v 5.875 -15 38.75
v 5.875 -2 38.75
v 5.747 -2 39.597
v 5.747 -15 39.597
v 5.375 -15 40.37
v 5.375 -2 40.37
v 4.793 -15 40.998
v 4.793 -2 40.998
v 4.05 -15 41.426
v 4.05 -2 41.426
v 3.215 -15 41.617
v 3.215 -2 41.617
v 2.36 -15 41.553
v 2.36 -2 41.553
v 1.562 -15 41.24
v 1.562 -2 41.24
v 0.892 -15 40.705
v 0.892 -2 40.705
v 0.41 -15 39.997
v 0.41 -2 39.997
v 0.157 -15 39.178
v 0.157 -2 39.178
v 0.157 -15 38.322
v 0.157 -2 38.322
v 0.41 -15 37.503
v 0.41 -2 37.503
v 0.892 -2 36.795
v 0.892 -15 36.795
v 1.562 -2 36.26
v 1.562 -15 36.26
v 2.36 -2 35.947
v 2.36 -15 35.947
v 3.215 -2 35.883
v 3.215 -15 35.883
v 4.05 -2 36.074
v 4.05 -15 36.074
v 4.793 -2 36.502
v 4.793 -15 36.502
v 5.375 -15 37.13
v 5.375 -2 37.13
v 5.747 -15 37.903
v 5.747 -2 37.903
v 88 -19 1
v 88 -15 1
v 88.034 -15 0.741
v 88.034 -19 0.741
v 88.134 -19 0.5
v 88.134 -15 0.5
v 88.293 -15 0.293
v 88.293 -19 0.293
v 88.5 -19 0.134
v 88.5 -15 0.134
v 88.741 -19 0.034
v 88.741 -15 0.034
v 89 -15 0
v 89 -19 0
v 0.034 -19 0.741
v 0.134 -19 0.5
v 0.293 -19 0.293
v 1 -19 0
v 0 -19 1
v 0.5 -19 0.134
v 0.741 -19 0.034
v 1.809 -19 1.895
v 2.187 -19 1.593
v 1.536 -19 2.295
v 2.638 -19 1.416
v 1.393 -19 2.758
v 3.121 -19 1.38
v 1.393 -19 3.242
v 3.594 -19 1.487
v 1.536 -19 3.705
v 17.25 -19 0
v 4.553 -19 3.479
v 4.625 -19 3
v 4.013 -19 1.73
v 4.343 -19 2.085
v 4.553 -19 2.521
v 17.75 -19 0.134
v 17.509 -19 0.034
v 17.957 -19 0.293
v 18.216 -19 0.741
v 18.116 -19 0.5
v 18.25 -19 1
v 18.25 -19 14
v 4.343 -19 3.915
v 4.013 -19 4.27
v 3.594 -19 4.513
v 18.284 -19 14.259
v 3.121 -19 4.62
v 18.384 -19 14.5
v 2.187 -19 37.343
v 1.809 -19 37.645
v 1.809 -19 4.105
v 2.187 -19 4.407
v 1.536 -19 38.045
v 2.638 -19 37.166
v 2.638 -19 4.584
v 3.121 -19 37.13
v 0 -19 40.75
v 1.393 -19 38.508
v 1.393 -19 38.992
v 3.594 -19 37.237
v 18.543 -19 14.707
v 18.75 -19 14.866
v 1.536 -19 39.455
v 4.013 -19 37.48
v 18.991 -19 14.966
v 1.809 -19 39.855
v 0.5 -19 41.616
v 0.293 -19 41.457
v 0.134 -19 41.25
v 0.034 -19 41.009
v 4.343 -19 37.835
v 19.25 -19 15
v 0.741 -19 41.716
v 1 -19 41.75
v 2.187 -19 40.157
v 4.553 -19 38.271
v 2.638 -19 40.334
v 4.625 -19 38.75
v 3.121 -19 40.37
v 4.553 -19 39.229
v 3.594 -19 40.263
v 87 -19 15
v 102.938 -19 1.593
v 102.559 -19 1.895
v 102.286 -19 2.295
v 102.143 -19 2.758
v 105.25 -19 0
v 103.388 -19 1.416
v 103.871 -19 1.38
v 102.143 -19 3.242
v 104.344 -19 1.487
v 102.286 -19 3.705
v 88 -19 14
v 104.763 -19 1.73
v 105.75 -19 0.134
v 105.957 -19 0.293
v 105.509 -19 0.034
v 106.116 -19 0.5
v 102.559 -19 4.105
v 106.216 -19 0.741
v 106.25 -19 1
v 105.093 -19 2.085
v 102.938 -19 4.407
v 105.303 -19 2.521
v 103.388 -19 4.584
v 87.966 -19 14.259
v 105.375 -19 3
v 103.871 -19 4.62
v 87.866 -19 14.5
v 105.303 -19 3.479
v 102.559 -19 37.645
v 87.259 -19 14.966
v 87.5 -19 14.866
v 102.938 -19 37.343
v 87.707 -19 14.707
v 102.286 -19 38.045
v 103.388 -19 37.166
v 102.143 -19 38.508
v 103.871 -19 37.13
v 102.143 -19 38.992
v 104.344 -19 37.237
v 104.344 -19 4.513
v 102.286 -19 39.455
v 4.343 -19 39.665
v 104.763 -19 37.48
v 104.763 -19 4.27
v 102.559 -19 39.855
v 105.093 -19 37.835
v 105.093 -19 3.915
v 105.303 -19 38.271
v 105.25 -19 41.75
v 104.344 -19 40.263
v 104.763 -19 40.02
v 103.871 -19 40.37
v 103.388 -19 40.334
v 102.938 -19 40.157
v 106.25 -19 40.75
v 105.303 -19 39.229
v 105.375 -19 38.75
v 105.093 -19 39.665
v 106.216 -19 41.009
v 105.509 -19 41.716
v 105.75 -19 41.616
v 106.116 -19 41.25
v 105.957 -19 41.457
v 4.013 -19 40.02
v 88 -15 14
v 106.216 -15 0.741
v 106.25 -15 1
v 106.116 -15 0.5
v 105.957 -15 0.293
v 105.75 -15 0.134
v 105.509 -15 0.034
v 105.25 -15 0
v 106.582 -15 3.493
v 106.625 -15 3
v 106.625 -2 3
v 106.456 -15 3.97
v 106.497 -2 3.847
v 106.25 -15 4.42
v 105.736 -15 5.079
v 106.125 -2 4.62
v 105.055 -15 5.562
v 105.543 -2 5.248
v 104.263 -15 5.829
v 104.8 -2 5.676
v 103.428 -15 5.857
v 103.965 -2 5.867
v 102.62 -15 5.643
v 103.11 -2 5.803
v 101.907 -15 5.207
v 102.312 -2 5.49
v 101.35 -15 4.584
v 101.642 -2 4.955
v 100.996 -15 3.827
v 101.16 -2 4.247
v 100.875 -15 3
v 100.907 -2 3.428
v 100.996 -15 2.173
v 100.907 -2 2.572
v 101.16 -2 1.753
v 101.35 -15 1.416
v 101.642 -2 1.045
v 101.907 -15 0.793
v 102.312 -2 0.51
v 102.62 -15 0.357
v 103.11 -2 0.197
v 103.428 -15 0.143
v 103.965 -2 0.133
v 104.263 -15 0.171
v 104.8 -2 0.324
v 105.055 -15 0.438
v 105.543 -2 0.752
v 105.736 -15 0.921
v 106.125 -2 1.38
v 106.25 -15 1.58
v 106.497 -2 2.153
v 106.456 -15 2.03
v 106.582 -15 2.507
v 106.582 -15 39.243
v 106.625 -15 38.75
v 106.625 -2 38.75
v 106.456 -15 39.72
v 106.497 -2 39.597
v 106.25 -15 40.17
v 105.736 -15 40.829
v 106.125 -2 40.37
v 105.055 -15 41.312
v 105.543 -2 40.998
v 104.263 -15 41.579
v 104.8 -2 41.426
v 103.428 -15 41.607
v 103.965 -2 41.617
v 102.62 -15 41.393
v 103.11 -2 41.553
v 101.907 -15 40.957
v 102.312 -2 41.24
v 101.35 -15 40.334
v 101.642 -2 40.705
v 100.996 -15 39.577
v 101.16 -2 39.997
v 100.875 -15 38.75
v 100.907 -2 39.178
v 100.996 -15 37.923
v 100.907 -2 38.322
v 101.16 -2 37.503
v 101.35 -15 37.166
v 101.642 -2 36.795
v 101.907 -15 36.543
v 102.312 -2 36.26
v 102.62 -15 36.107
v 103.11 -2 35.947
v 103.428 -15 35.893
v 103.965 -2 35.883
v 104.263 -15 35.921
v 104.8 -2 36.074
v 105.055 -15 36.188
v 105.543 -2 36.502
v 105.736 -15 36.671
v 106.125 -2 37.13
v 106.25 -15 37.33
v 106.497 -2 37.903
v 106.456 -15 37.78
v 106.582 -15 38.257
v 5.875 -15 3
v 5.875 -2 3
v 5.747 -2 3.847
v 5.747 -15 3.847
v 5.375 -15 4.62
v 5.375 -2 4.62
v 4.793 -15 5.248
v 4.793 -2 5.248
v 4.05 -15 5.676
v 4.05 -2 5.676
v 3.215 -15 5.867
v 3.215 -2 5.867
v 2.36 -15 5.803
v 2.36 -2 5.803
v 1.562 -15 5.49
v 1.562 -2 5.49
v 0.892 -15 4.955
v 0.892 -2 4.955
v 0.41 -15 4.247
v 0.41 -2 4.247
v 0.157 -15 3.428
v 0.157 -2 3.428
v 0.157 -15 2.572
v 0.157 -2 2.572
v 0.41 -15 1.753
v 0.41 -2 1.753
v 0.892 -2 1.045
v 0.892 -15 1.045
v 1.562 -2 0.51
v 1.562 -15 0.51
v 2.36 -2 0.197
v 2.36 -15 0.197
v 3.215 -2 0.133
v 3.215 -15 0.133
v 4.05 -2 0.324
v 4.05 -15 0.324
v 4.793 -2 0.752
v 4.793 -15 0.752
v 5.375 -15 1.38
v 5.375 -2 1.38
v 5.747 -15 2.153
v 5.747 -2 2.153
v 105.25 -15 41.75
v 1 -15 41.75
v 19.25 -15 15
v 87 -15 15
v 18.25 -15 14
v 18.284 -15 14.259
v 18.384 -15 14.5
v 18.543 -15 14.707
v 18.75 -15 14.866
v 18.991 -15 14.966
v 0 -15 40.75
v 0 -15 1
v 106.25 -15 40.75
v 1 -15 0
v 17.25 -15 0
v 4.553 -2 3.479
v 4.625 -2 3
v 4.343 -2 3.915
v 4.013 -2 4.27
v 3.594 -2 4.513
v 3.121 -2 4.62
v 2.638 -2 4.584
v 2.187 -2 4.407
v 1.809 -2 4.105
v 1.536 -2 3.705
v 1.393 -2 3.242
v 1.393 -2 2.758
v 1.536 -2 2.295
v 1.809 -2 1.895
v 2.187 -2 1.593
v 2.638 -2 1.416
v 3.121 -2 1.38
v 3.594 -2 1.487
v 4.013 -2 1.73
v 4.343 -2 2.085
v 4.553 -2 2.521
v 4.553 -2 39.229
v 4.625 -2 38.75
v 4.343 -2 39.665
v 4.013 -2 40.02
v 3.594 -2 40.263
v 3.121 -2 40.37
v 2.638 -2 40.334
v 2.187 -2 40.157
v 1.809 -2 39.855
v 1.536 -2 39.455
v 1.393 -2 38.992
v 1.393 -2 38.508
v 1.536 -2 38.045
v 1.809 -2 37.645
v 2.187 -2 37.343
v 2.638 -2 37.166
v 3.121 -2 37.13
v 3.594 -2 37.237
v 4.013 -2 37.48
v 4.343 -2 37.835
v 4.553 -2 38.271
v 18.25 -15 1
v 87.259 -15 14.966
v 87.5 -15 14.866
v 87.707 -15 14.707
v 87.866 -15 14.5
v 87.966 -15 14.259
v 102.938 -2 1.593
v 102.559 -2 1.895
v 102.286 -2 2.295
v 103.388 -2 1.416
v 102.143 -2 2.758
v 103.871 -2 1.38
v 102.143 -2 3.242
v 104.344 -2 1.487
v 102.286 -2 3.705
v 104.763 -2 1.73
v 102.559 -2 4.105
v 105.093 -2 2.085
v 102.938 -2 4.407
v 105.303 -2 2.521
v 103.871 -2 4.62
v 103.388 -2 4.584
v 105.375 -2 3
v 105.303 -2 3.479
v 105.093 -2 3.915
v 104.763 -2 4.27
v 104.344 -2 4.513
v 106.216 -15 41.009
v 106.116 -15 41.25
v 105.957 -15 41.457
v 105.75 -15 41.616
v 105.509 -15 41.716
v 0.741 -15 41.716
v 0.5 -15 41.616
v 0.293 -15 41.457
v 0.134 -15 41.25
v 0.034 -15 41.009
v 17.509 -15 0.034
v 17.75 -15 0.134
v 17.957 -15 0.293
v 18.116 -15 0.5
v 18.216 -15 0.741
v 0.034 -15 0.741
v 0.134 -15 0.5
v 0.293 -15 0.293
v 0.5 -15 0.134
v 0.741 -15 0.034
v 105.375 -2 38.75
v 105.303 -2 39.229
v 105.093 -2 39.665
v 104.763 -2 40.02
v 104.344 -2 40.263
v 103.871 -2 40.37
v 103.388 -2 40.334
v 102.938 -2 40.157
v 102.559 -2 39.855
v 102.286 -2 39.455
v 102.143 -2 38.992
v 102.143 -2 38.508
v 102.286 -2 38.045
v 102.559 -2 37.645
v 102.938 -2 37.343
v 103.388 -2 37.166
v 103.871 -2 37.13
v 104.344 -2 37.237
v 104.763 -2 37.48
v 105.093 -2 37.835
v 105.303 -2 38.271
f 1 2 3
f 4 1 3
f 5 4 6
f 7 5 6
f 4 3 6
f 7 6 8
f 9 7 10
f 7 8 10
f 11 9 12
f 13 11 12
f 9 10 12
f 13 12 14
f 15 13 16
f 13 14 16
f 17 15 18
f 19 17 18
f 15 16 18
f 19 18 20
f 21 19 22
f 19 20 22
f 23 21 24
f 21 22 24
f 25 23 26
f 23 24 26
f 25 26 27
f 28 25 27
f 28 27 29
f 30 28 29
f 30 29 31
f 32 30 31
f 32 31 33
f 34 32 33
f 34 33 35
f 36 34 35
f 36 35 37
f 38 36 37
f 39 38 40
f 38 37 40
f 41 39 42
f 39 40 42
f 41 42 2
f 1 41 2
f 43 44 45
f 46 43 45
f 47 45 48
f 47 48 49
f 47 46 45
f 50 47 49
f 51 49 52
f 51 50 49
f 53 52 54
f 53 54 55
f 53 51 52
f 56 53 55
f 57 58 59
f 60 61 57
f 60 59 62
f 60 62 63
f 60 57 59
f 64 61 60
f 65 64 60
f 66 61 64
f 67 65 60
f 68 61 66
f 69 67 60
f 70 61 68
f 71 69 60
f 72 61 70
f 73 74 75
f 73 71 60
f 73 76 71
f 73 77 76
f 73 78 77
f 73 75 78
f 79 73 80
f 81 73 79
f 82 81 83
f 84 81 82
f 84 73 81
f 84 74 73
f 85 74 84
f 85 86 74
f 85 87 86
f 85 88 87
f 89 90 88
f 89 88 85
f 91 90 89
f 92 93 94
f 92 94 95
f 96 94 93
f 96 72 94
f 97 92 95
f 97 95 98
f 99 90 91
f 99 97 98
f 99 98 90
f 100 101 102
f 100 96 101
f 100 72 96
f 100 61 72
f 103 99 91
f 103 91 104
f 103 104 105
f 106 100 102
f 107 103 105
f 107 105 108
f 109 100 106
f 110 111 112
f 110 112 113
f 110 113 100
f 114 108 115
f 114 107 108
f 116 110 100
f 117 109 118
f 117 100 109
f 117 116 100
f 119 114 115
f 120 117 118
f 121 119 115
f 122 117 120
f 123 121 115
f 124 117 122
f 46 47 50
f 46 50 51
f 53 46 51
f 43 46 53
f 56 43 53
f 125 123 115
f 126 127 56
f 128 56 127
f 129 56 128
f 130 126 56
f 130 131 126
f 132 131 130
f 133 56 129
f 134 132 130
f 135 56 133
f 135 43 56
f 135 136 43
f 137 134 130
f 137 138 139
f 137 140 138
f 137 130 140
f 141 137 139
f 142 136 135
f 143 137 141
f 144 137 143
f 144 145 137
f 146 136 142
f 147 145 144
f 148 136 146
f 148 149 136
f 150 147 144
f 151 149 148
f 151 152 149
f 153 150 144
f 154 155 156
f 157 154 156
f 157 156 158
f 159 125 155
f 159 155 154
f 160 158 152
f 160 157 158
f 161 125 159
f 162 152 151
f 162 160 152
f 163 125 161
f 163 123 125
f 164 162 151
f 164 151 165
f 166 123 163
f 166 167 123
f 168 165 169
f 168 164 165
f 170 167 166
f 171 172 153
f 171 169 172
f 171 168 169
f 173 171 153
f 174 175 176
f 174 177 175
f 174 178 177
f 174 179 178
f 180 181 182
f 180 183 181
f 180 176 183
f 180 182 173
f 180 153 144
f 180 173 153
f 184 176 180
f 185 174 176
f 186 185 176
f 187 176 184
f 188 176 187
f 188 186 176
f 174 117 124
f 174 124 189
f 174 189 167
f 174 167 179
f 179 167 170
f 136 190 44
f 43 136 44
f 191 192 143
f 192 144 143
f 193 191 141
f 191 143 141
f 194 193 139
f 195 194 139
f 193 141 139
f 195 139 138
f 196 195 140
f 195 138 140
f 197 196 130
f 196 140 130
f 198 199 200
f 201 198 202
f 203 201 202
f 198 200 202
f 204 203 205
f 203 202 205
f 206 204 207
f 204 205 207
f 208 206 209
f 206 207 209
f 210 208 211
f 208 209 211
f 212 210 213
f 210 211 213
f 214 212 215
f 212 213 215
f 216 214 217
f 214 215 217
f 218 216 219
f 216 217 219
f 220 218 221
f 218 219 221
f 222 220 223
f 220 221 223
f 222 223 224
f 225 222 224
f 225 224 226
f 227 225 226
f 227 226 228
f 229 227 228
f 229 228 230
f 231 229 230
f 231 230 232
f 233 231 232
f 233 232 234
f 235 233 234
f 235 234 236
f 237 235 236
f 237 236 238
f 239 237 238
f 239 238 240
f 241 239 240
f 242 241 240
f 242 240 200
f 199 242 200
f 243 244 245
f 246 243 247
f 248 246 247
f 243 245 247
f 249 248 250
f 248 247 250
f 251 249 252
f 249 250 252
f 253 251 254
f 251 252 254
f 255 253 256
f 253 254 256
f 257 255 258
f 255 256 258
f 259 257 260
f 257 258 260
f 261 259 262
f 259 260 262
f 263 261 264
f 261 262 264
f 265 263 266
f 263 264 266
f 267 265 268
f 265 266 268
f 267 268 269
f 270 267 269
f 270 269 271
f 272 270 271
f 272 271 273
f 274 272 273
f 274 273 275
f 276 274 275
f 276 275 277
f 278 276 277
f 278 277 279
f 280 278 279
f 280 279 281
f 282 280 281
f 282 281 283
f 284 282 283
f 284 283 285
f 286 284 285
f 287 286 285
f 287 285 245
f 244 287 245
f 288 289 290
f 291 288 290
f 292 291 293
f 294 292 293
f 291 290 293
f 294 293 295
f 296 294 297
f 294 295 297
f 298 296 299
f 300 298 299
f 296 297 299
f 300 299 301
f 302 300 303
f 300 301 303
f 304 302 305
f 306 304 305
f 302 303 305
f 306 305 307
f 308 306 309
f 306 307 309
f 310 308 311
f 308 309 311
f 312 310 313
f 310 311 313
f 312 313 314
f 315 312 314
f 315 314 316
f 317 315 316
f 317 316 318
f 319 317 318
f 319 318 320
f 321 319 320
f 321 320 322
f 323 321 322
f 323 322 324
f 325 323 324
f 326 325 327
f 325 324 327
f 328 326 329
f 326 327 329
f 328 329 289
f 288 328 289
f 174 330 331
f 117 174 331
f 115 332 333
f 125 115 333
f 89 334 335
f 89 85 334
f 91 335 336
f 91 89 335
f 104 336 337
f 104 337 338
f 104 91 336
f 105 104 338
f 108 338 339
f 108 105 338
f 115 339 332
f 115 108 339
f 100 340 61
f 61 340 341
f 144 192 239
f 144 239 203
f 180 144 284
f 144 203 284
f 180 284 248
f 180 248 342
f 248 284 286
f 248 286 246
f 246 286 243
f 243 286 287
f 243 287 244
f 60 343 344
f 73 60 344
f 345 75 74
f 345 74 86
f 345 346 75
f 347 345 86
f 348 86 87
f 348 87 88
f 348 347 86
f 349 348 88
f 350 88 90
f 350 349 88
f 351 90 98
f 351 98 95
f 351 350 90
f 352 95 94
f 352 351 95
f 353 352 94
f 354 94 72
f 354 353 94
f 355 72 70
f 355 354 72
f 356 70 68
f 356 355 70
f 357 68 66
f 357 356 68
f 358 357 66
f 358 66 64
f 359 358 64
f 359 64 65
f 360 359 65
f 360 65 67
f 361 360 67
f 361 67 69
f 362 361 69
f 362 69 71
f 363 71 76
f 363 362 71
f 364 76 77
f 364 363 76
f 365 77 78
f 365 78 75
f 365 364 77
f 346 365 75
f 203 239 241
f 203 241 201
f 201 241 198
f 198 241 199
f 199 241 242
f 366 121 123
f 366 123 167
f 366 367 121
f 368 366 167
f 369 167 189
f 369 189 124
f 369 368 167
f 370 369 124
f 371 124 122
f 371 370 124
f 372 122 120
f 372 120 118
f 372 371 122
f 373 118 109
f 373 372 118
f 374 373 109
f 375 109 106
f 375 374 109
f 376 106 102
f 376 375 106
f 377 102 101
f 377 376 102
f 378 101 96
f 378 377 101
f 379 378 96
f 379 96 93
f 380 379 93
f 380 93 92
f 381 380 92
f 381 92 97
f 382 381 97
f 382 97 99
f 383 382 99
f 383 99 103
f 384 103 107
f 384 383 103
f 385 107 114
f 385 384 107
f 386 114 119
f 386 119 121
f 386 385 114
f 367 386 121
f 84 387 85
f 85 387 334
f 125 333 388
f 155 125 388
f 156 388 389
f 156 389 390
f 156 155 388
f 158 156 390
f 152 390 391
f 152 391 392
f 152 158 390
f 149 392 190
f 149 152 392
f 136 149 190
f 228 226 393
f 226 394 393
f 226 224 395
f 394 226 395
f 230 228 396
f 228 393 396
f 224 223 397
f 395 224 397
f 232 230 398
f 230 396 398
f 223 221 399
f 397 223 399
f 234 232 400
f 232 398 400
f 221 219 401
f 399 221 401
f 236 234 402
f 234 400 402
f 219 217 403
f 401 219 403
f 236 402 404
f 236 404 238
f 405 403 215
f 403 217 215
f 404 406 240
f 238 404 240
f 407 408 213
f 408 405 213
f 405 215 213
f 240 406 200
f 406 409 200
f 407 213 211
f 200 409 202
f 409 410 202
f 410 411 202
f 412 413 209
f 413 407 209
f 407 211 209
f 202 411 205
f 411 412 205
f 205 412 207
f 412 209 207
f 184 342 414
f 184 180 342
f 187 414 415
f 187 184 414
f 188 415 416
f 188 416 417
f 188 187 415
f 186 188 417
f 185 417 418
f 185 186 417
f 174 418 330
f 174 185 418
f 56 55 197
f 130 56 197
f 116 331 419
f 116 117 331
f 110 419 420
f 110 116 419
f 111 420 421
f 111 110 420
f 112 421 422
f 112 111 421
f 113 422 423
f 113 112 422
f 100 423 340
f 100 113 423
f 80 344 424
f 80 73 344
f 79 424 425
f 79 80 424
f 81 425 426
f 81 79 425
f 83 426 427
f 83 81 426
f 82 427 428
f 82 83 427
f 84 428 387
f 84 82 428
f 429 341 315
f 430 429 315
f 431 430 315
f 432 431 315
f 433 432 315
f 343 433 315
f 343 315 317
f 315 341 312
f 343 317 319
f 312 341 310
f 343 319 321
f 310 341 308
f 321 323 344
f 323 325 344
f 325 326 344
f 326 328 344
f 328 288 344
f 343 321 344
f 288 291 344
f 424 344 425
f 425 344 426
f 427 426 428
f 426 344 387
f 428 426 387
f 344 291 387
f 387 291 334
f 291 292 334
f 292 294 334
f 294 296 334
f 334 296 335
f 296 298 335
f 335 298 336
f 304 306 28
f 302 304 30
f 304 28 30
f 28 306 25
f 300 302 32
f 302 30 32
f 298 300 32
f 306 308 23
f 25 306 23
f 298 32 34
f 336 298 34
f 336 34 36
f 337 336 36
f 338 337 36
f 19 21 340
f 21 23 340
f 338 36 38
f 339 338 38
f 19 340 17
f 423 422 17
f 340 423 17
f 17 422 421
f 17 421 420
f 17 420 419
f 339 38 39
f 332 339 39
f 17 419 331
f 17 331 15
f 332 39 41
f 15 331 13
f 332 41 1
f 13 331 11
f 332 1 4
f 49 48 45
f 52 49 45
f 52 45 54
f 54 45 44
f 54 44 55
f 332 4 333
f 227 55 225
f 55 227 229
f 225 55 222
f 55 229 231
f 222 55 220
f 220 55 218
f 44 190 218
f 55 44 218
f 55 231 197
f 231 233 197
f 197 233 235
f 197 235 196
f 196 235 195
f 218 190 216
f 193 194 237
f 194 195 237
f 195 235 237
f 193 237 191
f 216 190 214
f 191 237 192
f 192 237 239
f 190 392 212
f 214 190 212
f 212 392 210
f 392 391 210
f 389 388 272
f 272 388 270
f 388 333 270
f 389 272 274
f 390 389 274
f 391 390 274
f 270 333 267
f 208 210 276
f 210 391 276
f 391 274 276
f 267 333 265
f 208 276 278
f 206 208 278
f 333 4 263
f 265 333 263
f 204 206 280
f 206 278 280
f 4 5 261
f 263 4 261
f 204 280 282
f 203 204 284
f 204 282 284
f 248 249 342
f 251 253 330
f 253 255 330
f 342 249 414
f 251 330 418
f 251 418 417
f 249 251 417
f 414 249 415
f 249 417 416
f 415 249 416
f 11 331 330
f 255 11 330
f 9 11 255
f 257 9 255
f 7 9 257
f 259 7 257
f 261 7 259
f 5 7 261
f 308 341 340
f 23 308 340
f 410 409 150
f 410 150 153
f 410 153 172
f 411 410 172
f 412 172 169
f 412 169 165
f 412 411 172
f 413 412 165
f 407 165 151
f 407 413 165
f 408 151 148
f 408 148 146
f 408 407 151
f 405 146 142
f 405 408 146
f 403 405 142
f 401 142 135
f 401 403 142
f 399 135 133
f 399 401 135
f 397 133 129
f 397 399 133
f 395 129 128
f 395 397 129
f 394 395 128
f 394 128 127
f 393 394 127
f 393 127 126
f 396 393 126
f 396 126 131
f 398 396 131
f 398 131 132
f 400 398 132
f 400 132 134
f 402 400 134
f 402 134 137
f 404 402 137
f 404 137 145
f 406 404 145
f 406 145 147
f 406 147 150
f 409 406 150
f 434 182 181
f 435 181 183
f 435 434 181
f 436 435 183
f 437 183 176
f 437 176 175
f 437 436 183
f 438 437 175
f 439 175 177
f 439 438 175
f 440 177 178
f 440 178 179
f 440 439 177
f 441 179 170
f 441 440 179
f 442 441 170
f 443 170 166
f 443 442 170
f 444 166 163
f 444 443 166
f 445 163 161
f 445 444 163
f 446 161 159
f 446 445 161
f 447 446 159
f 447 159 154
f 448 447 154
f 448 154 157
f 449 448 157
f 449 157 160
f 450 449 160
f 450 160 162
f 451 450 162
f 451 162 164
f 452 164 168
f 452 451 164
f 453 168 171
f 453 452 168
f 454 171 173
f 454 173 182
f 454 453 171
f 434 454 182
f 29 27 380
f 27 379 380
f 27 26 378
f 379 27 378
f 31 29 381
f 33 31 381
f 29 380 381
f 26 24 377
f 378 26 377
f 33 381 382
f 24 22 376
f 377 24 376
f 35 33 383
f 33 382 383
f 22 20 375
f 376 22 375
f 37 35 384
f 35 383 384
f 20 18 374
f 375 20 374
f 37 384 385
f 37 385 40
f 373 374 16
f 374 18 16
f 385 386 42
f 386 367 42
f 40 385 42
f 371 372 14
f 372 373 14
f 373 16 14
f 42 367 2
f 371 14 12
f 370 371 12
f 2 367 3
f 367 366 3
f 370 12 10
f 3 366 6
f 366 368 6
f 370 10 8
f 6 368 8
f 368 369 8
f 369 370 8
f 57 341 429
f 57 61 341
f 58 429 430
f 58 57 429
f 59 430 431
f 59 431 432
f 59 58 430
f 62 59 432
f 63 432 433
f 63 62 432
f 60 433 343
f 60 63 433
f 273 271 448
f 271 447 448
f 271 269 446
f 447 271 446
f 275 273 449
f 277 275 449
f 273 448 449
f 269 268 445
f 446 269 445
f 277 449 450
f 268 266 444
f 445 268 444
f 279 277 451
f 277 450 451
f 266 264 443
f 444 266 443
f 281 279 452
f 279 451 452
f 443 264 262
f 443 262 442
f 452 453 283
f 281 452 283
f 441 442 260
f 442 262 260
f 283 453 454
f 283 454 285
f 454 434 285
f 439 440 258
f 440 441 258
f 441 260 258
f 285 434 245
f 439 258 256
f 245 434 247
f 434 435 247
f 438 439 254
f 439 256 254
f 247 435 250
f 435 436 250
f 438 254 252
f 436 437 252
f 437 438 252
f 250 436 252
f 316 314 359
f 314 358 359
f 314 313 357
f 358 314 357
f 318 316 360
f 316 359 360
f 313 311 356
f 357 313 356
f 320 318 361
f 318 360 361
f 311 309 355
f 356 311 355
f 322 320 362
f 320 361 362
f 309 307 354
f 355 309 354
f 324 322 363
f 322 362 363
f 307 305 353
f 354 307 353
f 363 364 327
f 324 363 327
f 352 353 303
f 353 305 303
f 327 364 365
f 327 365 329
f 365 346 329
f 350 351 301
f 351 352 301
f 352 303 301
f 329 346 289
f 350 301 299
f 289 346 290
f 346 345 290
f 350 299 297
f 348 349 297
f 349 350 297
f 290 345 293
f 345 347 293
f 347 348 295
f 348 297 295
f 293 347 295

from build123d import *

# Parameters (mm, degrees)
SKETCH051_R                = 2.875
SKETCH051_R_2              = 1.625
EXTRUDE049_DEPTH           = 13
EXTRUDE049_PLACEMENT_ANGLE = 270
SKETCH050_R                = 1.625
EXTRUDE048_DEPTH           = 4
EXTRUDE048_PLACEMENT_ANGLE = 270
FILLET040_R                = 1


with BuildPart() as spacer001:
    # Sketch051 → Extrude049 (new body)
    with BuildSketch(Plane.YZ):
        with Locations((3, 38.75)):
            Circle(SKETCH051_R)
        with Locations((3, 38.75)):
            Circle(SKETCH051_R_2, mode=Mode.SUBTRACT)
        with Locations((3, 3)):
            Circle(SKETCH051_R)
        with Locations((3, 3)):
            Circle(SKETCH051_R_2, mode=Mode.SUBTRACT)
        with Locations((103.75, 3)):
            Circle(SKETCH051_R)
        with Locations((103.75, 3)):
            Circle(SKETCH051_R_2, mode=Mode.SUBTRACT)
        with Locations((103.75, 38.75)):
            Circle(SKETCH051_R)
        with Locations((103.75, 38.75)):
            Circle(SKETCH051_R_2, mode=Mode.SUBTRACT)
    extrude(amount=EXTRUDE049_DEPTH)


with BuildPart() as spacer001_1:
    # Extrude049 placement: moved
    add(spacer001.part.moved(Location((0, -2, 0))).rotate(Axis((0, -2, 0), (0, 0, 1)), EXTRUDE049_PLACEMENT_ANGLE))


with BuildPart() as top_fillet001:
    # Sketch050 → Extrude048 (new body)
    with BuildSketch(Plane.YZ):
        Polygon((106.25, 0), (106.25, 41.75), (0, 41.75), (0, 0), (18.25, 0), (18.25, 15), (88, 15), (88, 0), align=None)
        with Locations((3, 3)):
            Circle(SKETCH050_R, mode=Mode.SUBTRACT)
        with Locations((3, 38.75)):
            Circle(SKETCH050_R, mode=Mode.SUBTRACT)
        with Locations((103.75, 38.75)):
            Circle(SKETCH050_R, mode=Mode.SUBTRACT)
        with Locations((103.75, 3)):
            Circle(SKETCH050_R, mode=Mode.SUBTRACT)
    extrude(amount=EXTRUDE048_DEPTH)


with BuildPart() as top_fillet001_1:
    # Extrude048 placement: moved
    add(top_fillet001.part.moved(Location((0, -15, 0))).rotate(Axis((0, -15, 0), (0, 0, 1)), EXTRUDE048_PLACEMENT_ANGLE))

    # Fusion077: union spacer001
    add(spacer001_1.part)

    # Fillet040
    fillet040_edges = [top_fillet001_1.edges().sort_by_distance(p)[0] for p in [
        (106.25, -17, 0),
        (106.25, -17, 41.75),
        (88, -17, 0),
        (0, -17, 41.75),
        (88, -17, 15),
        (0, -17, 0),
        (18.25, -17, 15),
        (18.25, -17, 0),
    ]]
    fillet(fillet040_edges, radius=FILLET040_R)


solid = top_fillet001_1.part
